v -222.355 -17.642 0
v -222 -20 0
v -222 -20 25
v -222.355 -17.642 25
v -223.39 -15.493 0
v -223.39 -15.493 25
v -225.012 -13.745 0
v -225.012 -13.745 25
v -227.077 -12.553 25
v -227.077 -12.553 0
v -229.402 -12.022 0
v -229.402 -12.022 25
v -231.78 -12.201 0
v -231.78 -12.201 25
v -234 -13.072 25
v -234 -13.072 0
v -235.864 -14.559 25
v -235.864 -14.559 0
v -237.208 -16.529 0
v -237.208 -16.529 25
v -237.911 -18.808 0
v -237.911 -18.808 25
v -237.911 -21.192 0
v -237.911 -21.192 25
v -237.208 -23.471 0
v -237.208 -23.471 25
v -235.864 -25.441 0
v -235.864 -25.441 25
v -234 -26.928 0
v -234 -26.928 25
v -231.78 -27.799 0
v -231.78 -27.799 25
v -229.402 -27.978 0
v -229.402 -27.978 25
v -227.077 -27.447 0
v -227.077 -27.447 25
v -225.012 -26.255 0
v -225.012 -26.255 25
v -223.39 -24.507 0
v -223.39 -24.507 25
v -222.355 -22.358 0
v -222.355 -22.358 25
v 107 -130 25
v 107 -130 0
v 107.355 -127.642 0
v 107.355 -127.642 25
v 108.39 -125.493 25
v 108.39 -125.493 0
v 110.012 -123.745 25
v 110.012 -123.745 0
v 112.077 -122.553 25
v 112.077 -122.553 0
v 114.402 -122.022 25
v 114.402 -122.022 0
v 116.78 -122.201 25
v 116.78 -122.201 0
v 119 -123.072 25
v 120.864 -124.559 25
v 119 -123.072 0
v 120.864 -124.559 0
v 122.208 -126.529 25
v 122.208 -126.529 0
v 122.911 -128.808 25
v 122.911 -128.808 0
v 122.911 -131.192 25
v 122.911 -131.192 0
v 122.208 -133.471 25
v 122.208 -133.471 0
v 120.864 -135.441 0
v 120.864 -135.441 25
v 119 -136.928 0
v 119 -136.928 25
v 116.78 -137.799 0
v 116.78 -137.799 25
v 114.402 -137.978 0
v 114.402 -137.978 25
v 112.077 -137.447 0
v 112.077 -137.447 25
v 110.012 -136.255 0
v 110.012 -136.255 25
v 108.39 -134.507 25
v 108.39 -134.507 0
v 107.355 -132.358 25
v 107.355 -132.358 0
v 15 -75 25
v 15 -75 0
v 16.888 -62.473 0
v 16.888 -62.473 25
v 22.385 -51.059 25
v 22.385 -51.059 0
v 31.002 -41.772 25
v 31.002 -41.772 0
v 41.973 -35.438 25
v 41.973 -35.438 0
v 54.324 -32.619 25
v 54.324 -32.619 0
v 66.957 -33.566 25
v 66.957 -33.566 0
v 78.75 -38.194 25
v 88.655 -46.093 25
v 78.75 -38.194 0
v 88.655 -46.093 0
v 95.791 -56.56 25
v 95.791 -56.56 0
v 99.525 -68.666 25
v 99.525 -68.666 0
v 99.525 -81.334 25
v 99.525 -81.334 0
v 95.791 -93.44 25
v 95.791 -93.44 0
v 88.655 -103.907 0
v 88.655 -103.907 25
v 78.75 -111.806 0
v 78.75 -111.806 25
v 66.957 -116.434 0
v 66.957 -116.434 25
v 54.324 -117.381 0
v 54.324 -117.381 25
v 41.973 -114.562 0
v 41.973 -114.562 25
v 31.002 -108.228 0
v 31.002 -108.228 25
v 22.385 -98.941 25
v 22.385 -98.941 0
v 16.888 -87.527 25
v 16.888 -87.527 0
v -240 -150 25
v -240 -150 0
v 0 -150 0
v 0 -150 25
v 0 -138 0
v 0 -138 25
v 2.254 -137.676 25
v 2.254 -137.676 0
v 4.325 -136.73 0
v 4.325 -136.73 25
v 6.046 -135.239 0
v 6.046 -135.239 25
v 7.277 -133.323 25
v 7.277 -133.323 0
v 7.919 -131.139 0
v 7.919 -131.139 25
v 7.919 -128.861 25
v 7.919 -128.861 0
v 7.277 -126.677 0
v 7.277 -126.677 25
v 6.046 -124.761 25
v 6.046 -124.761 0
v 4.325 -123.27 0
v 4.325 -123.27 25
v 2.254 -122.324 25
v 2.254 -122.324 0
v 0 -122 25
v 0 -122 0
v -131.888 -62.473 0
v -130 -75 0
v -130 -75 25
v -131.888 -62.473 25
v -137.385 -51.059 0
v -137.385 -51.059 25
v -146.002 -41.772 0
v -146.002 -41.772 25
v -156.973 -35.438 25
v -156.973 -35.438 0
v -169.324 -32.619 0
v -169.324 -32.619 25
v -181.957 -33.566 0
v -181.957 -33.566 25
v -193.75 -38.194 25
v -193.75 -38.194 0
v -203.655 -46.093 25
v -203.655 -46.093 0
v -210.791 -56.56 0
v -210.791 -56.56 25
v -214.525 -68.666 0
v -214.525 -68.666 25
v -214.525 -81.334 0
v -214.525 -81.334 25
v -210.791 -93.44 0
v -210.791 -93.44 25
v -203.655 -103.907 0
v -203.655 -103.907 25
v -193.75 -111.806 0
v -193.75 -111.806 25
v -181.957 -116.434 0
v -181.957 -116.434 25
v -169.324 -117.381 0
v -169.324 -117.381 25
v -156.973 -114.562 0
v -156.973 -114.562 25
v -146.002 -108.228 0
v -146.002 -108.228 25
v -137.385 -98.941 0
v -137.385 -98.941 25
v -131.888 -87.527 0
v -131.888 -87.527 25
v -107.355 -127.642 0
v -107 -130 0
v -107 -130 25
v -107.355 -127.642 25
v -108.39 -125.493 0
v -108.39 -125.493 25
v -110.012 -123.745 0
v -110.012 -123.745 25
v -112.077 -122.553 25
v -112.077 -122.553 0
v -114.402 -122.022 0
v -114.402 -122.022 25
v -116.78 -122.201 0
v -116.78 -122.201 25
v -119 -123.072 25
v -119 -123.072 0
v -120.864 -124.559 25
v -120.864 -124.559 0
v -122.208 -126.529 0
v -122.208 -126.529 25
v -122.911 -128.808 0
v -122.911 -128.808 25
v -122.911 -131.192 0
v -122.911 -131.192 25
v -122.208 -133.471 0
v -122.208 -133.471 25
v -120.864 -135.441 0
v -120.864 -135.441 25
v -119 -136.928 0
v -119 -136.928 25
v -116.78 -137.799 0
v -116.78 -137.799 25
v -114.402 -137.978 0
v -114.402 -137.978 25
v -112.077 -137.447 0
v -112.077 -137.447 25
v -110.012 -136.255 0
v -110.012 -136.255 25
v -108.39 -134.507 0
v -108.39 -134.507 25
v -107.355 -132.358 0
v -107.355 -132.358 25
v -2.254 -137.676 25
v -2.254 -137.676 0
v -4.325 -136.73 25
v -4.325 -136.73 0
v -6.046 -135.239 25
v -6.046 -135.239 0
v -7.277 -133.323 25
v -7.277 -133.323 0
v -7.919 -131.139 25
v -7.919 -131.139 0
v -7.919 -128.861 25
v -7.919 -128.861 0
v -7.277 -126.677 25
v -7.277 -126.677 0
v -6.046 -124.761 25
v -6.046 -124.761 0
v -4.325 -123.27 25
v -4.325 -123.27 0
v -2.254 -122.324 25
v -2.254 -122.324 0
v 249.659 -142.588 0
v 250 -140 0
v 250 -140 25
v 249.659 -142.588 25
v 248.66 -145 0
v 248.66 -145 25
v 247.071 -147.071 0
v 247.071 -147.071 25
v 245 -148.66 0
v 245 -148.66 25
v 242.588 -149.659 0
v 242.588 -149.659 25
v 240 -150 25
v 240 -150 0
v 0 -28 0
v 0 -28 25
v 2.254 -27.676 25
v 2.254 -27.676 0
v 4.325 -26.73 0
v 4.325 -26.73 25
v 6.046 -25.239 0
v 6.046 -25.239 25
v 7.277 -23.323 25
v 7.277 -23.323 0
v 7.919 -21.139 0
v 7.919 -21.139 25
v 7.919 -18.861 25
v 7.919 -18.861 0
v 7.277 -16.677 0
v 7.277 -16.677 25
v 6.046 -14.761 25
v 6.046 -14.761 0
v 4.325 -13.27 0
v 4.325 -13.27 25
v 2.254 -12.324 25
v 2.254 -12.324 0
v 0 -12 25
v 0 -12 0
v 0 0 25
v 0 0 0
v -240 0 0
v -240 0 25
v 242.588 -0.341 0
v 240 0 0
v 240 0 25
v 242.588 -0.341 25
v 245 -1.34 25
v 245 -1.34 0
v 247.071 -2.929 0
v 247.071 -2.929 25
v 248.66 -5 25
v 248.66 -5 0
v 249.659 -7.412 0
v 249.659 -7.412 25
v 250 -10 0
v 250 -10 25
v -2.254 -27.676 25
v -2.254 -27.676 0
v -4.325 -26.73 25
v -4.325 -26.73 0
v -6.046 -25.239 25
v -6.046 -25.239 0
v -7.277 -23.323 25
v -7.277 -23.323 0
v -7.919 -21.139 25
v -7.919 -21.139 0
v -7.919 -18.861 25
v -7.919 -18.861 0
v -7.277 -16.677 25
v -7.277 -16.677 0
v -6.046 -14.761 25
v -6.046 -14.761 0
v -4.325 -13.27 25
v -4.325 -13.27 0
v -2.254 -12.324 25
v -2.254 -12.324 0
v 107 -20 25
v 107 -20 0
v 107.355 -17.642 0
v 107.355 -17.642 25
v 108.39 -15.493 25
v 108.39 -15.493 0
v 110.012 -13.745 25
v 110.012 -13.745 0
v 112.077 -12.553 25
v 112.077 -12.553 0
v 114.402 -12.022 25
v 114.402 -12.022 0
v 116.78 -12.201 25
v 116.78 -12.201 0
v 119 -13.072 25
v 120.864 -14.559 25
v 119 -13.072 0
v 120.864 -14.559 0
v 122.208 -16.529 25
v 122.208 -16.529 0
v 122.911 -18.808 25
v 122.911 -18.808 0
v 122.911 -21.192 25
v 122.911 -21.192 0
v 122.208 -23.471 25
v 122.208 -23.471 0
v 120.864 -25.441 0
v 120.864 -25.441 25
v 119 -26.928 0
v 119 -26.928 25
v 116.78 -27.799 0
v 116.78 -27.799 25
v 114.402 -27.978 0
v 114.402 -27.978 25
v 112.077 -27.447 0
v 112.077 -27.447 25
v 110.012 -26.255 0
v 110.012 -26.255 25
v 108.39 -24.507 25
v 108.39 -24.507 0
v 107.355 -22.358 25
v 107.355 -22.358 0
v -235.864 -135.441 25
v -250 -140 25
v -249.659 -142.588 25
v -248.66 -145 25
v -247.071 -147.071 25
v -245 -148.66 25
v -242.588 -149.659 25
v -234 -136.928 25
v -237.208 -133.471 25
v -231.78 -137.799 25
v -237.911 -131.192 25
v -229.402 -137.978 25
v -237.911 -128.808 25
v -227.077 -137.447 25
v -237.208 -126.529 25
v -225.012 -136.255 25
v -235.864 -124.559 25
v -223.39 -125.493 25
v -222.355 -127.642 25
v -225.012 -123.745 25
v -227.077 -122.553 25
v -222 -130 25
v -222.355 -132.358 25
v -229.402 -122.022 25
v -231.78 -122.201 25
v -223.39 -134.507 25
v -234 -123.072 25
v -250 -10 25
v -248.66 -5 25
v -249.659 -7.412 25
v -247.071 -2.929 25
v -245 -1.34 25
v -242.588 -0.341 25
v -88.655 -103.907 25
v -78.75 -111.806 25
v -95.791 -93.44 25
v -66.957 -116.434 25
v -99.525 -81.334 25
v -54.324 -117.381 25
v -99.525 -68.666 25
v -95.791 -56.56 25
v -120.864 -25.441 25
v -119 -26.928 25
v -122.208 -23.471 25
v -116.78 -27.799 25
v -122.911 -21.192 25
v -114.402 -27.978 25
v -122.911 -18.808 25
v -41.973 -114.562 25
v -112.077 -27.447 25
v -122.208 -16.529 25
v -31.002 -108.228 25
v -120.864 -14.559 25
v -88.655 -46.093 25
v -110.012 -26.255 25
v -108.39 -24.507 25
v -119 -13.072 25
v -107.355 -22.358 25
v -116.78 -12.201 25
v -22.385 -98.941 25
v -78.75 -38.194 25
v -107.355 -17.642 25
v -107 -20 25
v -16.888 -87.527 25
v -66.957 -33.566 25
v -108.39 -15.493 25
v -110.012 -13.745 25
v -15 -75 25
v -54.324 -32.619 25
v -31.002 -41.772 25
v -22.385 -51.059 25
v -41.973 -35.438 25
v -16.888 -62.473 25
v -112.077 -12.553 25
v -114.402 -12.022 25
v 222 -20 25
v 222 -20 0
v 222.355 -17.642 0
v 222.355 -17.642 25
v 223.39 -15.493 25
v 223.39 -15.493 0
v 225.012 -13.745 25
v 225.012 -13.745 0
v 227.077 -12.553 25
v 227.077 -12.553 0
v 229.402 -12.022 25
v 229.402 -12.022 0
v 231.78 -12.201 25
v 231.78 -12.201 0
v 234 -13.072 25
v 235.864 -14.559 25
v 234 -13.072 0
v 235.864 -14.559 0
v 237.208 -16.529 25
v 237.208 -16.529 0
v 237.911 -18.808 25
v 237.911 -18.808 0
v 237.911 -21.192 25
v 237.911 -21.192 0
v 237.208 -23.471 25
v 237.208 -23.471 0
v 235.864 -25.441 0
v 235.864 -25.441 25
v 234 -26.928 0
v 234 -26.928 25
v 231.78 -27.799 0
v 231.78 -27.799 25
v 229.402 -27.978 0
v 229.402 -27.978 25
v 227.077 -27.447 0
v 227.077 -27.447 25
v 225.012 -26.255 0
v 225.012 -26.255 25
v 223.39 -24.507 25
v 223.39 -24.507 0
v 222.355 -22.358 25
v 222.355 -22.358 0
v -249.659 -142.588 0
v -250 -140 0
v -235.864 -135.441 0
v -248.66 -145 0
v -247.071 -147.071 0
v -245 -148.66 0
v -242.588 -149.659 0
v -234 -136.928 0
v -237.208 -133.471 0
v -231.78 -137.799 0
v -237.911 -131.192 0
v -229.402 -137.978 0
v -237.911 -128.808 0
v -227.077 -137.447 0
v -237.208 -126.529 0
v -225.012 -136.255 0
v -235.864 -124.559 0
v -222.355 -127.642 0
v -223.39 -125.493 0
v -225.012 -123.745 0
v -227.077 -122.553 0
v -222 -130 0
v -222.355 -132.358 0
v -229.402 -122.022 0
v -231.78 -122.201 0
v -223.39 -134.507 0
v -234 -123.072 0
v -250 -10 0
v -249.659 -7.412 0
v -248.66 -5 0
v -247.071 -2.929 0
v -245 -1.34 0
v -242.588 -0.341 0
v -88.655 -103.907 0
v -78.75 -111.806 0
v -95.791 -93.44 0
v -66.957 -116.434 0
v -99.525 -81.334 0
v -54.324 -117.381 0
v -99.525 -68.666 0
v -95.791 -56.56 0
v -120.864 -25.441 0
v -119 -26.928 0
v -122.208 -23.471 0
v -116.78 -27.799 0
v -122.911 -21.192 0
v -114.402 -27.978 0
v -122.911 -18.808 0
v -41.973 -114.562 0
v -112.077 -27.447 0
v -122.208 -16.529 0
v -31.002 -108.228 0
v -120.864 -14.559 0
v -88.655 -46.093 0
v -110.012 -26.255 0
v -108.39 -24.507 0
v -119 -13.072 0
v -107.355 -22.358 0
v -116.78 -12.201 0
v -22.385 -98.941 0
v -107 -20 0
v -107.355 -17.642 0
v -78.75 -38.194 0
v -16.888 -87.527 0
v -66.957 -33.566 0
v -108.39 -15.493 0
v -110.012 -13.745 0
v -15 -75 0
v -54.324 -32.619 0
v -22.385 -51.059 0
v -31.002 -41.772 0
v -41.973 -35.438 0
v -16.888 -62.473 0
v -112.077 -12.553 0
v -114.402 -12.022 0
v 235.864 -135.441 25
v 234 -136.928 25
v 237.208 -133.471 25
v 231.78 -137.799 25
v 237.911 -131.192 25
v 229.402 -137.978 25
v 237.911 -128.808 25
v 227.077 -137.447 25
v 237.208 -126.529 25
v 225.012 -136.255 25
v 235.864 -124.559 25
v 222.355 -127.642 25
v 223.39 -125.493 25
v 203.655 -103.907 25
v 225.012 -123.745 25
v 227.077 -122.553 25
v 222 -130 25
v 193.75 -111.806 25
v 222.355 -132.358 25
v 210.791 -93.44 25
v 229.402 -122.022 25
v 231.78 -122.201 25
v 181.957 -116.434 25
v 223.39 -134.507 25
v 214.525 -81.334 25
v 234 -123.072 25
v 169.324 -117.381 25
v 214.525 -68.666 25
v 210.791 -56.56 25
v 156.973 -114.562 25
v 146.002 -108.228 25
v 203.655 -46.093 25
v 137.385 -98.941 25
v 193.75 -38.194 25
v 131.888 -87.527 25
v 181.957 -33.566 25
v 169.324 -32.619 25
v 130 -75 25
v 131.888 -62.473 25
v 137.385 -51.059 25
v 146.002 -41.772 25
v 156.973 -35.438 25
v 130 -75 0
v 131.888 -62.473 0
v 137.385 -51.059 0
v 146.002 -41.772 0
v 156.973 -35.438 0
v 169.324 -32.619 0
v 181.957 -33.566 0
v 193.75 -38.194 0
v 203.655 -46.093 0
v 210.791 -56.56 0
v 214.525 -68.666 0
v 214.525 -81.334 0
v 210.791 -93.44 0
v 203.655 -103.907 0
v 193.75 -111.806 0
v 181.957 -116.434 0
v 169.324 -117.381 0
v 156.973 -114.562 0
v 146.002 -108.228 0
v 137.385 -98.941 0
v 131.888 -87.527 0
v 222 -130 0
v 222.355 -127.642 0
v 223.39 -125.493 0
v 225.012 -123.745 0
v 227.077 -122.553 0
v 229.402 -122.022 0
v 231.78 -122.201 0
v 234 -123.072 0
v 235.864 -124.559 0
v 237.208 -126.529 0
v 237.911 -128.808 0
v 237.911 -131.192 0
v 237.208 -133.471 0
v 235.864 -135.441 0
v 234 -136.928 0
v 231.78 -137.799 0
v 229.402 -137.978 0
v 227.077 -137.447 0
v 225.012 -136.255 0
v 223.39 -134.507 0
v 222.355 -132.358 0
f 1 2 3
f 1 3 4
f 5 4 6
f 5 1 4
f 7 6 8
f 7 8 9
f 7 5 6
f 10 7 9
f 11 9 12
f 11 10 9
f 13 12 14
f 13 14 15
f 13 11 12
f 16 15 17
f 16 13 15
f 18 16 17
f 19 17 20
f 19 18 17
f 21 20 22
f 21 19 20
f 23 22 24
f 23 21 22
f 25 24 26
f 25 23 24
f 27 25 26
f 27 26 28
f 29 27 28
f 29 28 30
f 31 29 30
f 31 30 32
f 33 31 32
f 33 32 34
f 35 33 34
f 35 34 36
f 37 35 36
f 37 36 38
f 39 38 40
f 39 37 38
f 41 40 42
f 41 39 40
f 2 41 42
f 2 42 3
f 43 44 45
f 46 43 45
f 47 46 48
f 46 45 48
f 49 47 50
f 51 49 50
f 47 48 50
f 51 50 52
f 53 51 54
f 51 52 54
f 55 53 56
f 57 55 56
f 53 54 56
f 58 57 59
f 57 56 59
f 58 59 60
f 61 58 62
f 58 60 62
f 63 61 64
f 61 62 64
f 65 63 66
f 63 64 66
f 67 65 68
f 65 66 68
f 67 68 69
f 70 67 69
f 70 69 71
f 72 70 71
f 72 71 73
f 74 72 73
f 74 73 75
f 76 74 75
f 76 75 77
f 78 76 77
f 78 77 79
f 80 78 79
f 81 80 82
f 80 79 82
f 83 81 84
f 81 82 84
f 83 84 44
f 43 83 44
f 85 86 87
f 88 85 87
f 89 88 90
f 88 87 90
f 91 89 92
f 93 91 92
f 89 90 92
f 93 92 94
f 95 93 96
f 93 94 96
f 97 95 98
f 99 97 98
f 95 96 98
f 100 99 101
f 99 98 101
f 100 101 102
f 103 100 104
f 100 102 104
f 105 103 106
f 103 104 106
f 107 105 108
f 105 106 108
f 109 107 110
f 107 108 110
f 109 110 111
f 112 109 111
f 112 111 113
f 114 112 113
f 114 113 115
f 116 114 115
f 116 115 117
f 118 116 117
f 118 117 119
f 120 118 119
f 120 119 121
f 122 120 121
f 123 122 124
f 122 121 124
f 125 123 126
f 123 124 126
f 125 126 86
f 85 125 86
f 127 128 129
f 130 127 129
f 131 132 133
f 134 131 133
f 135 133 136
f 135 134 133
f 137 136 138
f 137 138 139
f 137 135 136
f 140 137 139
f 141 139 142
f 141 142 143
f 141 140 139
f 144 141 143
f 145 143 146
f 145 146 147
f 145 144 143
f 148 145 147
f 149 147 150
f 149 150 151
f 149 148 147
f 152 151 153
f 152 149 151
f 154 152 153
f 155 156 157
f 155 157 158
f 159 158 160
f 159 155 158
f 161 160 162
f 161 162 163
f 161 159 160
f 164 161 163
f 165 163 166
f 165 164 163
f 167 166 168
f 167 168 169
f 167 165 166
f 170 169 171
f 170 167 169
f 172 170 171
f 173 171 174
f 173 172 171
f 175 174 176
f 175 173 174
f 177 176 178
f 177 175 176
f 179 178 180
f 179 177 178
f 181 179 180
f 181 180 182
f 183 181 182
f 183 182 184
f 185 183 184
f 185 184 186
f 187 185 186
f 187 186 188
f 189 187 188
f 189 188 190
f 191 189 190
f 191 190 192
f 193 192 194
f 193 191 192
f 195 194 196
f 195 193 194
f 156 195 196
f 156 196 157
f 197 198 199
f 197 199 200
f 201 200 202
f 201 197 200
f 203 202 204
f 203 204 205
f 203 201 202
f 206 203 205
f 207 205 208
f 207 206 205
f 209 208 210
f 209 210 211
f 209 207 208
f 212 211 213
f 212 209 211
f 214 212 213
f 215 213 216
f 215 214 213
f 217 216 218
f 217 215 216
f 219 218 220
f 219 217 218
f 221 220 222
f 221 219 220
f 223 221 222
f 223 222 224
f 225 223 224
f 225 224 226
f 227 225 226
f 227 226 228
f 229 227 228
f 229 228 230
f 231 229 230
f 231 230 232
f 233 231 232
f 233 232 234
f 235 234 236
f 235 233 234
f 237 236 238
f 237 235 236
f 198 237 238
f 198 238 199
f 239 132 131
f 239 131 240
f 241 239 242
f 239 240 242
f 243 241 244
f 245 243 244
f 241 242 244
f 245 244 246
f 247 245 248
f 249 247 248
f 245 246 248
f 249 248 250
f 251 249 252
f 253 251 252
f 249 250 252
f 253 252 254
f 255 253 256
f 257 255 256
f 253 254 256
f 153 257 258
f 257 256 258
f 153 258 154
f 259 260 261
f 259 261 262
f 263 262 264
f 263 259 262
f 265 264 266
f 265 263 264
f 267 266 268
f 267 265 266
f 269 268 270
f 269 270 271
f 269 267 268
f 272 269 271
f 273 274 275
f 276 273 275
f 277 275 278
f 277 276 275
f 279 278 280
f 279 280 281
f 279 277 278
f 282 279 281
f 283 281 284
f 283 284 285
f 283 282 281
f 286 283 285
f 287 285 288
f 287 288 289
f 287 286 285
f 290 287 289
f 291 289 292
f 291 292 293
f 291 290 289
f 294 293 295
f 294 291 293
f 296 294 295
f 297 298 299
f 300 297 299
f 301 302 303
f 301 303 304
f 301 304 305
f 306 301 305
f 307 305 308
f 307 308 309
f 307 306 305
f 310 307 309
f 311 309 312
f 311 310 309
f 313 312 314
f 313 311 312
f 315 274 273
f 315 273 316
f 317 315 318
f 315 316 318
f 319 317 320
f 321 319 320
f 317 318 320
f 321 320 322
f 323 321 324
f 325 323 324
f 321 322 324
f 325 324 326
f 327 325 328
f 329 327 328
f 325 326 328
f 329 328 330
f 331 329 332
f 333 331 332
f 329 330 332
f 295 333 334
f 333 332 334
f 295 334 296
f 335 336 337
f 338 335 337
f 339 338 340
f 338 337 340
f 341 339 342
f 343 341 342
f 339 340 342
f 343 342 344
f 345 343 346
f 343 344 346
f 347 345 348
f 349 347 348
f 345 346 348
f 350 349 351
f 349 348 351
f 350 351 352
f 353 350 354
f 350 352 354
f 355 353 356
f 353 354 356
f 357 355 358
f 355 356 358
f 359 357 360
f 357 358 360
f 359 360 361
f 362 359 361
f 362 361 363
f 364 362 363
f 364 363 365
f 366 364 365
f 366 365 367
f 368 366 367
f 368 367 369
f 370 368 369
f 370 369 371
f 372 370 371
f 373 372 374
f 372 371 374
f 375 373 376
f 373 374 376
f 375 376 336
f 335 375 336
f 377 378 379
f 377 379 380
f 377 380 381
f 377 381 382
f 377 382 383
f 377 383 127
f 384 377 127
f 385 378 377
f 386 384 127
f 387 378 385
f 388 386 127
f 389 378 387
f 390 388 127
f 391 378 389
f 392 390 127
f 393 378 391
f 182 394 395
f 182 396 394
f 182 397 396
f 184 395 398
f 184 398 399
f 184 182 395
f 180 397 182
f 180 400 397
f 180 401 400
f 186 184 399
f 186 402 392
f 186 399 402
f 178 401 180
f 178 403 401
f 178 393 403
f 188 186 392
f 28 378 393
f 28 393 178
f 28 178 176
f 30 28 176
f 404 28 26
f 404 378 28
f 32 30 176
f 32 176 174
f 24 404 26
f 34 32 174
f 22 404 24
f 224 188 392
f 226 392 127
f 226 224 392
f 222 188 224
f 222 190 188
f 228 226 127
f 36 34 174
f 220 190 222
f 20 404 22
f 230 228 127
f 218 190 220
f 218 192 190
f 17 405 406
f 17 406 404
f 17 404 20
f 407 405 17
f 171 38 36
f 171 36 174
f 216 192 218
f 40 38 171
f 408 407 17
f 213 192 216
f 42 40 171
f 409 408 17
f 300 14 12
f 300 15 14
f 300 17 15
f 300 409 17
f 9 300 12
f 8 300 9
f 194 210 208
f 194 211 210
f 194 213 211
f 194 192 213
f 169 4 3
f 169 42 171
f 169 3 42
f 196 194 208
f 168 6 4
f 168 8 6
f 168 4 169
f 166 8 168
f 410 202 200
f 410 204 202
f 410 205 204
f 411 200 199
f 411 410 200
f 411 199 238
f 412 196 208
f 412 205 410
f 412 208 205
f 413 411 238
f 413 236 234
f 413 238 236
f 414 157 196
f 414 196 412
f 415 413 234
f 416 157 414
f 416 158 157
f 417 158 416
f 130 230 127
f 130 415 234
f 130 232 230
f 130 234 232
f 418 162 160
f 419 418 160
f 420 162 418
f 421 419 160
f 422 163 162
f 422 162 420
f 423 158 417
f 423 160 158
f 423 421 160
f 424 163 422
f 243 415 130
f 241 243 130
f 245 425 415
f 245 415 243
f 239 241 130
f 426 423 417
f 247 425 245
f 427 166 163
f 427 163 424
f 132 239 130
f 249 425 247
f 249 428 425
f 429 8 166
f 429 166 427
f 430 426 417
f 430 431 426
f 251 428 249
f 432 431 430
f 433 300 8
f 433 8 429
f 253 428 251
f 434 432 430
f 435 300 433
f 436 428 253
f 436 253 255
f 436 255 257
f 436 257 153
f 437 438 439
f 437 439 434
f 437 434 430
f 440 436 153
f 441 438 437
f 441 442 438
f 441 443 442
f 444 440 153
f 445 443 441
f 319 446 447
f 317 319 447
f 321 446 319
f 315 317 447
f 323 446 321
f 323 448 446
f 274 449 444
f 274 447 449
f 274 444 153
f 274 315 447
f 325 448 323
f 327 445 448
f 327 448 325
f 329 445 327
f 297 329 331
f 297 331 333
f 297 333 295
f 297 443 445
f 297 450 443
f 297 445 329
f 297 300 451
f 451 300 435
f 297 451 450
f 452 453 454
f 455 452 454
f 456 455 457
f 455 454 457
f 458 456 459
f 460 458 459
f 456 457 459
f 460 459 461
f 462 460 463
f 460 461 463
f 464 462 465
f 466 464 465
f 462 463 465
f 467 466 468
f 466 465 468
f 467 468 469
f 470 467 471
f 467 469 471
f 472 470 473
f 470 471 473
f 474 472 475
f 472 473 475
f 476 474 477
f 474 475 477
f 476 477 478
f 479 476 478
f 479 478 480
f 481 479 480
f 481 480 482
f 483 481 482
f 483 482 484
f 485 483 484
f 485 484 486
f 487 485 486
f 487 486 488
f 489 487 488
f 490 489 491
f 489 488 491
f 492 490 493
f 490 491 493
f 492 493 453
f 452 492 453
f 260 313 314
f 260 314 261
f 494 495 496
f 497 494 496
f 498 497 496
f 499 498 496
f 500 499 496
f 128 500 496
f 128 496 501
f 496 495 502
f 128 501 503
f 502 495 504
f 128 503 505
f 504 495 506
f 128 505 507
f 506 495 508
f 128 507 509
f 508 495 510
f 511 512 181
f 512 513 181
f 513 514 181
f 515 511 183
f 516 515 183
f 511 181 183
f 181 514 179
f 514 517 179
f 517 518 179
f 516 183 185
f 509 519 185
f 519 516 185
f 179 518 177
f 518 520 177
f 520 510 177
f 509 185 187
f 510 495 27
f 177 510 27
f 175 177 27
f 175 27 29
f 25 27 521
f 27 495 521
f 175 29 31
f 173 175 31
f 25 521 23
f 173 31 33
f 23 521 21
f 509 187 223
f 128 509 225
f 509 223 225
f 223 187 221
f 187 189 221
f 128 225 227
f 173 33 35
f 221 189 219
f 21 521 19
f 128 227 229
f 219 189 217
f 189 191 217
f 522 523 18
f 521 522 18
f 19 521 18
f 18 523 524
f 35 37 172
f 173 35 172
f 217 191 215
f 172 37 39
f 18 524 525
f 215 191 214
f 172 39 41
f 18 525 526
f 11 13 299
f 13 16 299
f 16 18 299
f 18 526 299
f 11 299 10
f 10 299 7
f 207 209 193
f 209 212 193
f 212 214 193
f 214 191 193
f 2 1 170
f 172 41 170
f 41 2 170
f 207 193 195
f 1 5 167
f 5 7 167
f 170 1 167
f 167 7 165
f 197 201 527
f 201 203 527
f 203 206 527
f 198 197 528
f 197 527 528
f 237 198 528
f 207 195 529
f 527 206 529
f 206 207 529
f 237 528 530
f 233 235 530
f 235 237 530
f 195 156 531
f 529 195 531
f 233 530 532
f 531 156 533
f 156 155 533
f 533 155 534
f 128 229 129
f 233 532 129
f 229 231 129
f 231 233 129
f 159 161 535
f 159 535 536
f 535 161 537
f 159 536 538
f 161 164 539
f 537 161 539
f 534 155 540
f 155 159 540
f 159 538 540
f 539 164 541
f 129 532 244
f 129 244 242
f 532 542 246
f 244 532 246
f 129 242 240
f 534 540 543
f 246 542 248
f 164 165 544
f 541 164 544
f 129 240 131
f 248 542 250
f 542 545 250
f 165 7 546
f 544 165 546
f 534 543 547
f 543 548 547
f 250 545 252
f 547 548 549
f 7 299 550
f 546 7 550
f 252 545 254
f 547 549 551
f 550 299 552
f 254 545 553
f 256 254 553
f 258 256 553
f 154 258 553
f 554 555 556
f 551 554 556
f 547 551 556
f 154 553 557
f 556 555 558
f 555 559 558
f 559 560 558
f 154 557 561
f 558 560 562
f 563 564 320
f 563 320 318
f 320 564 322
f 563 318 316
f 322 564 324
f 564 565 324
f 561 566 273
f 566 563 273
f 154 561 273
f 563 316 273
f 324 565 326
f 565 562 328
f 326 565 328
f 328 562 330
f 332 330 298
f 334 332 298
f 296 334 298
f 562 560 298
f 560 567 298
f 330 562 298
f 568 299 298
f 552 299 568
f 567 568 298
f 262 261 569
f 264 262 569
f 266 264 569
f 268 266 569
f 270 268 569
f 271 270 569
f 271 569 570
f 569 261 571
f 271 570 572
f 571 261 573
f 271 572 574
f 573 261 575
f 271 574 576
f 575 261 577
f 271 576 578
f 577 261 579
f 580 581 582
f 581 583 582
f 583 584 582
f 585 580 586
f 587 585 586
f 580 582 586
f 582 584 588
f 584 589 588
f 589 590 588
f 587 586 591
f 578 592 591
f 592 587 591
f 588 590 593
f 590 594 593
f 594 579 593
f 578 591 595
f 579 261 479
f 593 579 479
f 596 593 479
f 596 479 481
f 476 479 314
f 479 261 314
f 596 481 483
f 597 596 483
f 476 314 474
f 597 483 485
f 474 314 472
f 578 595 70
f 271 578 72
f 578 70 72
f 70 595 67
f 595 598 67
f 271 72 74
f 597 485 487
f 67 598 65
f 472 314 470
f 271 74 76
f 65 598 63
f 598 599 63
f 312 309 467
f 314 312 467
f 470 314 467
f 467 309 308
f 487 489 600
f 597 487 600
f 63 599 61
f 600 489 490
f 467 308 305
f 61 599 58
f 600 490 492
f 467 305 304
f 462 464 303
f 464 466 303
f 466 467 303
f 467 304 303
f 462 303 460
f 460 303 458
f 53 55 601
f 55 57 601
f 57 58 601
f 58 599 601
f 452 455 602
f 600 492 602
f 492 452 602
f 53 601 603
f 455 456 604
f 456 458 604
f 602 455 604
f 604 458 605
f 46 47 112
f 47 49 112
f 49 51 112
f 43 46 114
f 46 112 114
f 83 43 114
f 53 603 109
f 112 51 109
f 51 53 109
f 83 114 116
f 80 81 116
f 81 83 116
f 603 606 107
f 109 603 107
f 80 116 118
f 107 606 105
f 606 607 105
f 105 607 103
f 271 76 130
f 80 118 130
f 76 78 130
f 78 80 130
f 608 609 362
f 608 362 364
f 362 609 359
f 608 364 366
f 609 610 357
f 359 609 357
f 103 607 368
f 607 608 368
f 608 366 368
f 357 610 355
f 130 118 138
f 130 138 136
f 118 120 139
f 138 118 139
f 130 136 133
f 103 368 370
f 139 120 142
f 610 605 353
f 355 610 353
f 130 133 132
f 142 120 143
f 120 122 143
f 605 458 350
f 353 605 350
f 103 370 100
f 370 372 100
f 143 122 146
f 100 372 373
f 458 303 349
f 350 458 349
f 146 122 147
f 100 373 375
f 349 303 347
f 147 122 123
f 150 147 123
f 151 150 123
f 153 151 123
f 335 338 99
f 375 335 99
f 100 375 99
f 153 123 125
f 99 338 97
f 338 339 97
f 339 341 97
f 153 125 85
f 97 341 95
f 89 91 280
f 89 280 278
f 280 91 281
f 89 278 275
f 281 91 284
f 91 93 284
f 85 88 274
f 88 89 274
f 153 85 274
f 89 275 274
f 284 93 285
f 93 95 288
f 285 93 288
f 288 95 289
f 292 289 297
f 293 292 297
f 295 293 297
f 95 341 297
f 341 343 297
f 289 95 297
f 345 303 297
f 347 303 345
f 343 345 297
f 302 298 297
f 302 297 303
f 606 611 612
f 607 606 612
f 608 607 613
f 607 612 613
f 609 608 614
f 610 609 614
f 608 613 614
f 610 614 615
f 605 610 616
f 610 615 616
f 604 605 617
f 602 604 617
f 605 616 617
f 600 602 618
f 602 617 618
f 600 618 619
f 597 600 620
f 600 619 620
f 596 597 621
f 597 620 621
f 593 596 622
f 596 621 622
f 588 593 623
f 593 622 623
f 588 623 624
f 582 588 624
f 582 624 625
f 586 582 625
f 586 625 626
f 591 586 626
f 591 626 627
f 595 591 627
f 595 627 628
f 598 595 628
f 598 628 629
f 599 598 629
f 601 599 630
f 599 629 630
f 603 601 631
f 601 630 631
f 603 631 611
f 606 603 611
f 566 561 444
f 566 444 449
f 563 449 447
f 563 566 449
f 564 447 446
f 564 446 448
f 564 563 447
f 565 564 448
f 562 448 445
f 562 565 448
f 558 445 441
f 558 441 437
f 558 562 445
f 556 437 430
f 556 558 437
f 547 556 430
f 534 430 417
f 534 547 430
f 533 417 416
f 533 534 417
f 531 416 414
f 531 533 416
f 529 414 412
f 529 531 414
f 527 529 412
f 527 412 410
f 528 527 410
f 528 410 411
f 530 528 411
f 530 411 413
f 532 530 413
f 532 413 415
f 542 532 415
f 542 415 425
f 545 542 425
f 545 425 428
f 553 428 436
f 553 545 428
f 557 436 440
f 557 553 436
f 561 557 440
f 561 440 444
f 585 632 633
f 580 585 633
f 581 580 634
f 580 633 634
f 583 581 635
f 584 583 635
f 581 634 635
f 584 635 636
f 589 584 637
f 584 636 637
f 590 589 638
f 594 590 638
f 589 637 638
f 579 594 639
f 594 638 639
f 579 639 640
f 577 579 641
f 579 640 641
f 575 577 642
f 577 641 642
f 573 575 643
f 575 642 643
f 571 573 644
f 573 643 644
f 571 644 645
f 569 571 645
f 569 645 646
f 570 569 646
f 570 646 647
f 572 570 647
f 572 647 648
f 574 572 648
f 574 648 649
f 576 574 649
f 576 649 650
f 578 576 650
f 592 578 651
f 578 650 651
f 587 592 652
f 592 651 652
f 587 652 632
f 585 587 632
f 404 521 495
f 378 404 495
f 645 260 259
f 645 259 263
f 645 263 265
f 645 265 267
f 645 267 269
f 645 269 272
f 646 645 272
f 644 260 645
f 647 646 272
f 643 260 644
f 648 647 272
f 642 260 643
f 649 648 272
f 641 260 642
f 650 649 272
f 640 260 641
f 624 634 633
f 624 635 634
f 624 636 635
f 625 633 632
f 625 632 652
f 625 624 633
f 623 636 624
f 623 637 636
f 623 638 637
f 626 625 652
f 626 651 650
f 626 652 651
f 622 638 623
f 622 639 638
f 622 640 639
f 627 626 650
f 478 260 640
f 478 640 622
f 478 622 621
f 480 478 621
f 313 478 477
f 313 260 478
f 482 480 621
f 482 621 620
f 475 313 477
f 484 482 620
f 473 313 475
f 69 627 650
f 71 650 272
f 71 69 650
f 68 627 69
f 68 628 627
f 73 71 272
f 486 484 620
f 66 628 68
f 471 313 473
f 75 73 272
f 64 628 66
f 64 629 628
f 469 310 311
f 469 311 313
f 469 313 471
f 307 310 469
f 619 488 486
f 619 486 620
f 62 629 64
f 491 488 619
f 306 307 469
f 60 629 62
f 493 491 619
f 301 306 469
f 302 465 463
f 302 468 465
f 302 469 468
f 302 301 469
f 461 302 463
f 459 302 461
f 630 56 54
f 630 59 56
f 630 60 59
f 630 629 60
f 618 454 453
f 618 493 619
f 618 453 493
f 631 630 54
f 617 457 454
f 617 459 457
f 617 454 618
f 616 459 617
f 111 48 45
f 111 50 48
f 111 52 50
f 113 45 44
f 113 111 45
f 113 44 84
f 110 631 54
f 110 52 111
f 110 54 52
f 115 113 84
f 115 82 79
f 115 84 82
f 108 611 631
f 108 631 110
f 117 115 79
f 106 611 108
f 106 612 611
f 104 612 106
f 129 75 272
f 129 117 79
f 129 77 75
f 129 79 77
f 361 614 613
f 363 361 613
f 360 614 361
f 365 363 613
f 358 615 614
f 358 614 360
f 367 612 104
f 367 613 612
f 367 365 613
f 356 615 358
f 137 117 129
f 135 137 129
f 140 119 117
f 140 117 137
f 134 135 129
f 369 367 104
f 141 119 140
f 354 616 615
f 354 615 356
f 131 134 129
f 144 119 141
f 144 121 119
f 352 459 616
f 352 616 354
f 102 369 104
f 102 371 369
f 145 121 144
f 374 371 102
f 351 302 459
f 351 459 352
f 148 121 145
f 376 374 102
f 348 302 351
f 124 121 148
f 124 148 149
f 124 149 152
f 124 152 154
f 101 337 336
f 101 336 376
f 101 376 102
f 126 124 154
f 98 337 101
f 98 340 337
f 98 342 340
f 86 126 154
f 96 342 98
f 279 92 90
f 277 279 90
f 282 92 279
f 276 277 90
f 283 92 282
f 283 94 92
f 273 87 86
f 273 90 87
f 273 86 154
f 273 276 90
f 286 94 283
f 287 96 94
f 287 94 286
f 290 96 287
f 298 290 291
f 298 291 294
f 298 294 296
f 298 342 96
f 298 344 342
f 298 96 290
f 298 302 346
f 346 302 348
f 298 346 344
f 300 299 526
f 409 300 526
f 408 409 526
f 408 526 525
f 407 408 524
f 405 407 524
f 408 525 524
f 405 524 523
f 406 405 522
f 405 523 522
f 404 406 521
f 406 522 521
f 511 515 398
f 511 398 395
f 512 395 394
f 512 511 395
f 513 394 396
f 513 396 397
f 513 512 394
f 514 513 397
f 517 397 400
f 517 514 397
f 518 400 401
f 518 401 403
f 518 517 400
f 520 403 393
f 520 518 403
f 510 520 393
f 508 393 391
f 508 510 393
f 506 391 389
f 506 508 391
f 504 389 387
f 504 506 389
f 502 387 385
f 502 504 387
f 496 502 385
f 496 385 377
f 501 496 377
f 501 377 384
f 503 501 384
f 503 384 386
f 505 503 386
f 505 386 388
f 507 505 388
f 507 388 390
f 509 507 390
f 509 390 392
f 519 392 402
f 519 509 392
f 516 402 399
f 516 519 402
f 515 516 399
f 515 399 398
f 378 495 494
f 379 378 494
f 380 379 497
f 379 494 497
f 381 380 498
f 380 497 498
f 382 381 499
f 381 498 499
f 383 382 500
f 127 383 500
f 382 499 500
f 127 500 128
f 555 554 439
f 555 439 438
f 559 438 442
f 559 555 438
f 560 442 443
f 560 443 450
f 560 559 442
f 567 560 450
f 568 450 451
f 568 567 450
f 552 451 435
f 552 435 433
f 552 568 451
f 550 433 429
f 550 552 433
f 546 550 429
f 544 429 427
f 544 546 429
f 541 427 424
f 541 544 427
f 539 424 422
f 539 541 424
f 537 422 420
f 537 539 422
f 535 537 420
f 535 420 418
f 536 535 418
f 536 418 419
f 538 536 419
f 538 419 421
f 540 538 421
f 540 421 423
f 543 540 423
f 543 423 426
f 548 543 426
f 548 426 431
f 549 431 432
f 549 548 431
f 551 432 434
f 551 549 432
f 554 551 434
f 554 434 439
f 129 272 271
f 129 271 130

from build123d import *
from build123d import SkipClean  # not in build123d's __all__

# Parameters (mm, degrees)
F2_R     = 8
F2_R_2   = 42.5
F0_DEPTH = 25


with BuildPart() as f0:
    # F2 (on Top) → F0 (new body)
    with BuildSketch(Plane.XY):
        with BuildLine():
            Line((0, -12), (0, 0))
            Line((0, 0), (-240, 0))
            ThreePointArc((-240, 0), (-247.0710678119, -2.9289321881), (-250, -10))
            Line((-250, -10), (-250, -140))
            ThreePointArc((-250, -140), (-247.0710678119, -147.0710678119), (-240, -150))
            Line((-240, -150), (0, -150))
            Line((0, -150), (0, -138))
            ThreePointArc((0, -138), (-8, -130), (0, -122))
            Line((0, -122), (0, -28))
            ThreePointArc((0, -28), (-8, -20), (0, -12))
        make_face()
        with Locations((-230, -130)):
            Circle(F2_R, mode=Mode.SUBTRACT)
        with Locations((-115, -130)):
            Circle(F2_R, mode=Mode.SUBTRACT)
        with Locations((-172.5, -75)):
            Circle(F2_R_2, mode=Mode.SUBTRACT)
        with Locations((-230, -20)):
            Circle(F2_R, mode=Mode.SUBTRACT)
        with Locations((-57.5, -75)):
            Circle(F2_R_2, mode=Mode.SUBTRACT)
        with Locations((-115, -20)):
            Circle(F2_R, mode=Mode.SUBTRACT)
    extrude(amount=F0_DEPTH)

    # F1: F0 across face


with BuildPart() as f0_1:
    add(f0.part, clean=False)
    with SkipClean():  # cleaning this boolean's faces spoils the solid; the shape is the same uncleaned
        add(f0.part.mirror(Plane(origin=(0, -75, 12.5), x_dir=(0, 1, 0), z_dir=(1, 0, 0))), clean=False)


solid = f0_1.part
